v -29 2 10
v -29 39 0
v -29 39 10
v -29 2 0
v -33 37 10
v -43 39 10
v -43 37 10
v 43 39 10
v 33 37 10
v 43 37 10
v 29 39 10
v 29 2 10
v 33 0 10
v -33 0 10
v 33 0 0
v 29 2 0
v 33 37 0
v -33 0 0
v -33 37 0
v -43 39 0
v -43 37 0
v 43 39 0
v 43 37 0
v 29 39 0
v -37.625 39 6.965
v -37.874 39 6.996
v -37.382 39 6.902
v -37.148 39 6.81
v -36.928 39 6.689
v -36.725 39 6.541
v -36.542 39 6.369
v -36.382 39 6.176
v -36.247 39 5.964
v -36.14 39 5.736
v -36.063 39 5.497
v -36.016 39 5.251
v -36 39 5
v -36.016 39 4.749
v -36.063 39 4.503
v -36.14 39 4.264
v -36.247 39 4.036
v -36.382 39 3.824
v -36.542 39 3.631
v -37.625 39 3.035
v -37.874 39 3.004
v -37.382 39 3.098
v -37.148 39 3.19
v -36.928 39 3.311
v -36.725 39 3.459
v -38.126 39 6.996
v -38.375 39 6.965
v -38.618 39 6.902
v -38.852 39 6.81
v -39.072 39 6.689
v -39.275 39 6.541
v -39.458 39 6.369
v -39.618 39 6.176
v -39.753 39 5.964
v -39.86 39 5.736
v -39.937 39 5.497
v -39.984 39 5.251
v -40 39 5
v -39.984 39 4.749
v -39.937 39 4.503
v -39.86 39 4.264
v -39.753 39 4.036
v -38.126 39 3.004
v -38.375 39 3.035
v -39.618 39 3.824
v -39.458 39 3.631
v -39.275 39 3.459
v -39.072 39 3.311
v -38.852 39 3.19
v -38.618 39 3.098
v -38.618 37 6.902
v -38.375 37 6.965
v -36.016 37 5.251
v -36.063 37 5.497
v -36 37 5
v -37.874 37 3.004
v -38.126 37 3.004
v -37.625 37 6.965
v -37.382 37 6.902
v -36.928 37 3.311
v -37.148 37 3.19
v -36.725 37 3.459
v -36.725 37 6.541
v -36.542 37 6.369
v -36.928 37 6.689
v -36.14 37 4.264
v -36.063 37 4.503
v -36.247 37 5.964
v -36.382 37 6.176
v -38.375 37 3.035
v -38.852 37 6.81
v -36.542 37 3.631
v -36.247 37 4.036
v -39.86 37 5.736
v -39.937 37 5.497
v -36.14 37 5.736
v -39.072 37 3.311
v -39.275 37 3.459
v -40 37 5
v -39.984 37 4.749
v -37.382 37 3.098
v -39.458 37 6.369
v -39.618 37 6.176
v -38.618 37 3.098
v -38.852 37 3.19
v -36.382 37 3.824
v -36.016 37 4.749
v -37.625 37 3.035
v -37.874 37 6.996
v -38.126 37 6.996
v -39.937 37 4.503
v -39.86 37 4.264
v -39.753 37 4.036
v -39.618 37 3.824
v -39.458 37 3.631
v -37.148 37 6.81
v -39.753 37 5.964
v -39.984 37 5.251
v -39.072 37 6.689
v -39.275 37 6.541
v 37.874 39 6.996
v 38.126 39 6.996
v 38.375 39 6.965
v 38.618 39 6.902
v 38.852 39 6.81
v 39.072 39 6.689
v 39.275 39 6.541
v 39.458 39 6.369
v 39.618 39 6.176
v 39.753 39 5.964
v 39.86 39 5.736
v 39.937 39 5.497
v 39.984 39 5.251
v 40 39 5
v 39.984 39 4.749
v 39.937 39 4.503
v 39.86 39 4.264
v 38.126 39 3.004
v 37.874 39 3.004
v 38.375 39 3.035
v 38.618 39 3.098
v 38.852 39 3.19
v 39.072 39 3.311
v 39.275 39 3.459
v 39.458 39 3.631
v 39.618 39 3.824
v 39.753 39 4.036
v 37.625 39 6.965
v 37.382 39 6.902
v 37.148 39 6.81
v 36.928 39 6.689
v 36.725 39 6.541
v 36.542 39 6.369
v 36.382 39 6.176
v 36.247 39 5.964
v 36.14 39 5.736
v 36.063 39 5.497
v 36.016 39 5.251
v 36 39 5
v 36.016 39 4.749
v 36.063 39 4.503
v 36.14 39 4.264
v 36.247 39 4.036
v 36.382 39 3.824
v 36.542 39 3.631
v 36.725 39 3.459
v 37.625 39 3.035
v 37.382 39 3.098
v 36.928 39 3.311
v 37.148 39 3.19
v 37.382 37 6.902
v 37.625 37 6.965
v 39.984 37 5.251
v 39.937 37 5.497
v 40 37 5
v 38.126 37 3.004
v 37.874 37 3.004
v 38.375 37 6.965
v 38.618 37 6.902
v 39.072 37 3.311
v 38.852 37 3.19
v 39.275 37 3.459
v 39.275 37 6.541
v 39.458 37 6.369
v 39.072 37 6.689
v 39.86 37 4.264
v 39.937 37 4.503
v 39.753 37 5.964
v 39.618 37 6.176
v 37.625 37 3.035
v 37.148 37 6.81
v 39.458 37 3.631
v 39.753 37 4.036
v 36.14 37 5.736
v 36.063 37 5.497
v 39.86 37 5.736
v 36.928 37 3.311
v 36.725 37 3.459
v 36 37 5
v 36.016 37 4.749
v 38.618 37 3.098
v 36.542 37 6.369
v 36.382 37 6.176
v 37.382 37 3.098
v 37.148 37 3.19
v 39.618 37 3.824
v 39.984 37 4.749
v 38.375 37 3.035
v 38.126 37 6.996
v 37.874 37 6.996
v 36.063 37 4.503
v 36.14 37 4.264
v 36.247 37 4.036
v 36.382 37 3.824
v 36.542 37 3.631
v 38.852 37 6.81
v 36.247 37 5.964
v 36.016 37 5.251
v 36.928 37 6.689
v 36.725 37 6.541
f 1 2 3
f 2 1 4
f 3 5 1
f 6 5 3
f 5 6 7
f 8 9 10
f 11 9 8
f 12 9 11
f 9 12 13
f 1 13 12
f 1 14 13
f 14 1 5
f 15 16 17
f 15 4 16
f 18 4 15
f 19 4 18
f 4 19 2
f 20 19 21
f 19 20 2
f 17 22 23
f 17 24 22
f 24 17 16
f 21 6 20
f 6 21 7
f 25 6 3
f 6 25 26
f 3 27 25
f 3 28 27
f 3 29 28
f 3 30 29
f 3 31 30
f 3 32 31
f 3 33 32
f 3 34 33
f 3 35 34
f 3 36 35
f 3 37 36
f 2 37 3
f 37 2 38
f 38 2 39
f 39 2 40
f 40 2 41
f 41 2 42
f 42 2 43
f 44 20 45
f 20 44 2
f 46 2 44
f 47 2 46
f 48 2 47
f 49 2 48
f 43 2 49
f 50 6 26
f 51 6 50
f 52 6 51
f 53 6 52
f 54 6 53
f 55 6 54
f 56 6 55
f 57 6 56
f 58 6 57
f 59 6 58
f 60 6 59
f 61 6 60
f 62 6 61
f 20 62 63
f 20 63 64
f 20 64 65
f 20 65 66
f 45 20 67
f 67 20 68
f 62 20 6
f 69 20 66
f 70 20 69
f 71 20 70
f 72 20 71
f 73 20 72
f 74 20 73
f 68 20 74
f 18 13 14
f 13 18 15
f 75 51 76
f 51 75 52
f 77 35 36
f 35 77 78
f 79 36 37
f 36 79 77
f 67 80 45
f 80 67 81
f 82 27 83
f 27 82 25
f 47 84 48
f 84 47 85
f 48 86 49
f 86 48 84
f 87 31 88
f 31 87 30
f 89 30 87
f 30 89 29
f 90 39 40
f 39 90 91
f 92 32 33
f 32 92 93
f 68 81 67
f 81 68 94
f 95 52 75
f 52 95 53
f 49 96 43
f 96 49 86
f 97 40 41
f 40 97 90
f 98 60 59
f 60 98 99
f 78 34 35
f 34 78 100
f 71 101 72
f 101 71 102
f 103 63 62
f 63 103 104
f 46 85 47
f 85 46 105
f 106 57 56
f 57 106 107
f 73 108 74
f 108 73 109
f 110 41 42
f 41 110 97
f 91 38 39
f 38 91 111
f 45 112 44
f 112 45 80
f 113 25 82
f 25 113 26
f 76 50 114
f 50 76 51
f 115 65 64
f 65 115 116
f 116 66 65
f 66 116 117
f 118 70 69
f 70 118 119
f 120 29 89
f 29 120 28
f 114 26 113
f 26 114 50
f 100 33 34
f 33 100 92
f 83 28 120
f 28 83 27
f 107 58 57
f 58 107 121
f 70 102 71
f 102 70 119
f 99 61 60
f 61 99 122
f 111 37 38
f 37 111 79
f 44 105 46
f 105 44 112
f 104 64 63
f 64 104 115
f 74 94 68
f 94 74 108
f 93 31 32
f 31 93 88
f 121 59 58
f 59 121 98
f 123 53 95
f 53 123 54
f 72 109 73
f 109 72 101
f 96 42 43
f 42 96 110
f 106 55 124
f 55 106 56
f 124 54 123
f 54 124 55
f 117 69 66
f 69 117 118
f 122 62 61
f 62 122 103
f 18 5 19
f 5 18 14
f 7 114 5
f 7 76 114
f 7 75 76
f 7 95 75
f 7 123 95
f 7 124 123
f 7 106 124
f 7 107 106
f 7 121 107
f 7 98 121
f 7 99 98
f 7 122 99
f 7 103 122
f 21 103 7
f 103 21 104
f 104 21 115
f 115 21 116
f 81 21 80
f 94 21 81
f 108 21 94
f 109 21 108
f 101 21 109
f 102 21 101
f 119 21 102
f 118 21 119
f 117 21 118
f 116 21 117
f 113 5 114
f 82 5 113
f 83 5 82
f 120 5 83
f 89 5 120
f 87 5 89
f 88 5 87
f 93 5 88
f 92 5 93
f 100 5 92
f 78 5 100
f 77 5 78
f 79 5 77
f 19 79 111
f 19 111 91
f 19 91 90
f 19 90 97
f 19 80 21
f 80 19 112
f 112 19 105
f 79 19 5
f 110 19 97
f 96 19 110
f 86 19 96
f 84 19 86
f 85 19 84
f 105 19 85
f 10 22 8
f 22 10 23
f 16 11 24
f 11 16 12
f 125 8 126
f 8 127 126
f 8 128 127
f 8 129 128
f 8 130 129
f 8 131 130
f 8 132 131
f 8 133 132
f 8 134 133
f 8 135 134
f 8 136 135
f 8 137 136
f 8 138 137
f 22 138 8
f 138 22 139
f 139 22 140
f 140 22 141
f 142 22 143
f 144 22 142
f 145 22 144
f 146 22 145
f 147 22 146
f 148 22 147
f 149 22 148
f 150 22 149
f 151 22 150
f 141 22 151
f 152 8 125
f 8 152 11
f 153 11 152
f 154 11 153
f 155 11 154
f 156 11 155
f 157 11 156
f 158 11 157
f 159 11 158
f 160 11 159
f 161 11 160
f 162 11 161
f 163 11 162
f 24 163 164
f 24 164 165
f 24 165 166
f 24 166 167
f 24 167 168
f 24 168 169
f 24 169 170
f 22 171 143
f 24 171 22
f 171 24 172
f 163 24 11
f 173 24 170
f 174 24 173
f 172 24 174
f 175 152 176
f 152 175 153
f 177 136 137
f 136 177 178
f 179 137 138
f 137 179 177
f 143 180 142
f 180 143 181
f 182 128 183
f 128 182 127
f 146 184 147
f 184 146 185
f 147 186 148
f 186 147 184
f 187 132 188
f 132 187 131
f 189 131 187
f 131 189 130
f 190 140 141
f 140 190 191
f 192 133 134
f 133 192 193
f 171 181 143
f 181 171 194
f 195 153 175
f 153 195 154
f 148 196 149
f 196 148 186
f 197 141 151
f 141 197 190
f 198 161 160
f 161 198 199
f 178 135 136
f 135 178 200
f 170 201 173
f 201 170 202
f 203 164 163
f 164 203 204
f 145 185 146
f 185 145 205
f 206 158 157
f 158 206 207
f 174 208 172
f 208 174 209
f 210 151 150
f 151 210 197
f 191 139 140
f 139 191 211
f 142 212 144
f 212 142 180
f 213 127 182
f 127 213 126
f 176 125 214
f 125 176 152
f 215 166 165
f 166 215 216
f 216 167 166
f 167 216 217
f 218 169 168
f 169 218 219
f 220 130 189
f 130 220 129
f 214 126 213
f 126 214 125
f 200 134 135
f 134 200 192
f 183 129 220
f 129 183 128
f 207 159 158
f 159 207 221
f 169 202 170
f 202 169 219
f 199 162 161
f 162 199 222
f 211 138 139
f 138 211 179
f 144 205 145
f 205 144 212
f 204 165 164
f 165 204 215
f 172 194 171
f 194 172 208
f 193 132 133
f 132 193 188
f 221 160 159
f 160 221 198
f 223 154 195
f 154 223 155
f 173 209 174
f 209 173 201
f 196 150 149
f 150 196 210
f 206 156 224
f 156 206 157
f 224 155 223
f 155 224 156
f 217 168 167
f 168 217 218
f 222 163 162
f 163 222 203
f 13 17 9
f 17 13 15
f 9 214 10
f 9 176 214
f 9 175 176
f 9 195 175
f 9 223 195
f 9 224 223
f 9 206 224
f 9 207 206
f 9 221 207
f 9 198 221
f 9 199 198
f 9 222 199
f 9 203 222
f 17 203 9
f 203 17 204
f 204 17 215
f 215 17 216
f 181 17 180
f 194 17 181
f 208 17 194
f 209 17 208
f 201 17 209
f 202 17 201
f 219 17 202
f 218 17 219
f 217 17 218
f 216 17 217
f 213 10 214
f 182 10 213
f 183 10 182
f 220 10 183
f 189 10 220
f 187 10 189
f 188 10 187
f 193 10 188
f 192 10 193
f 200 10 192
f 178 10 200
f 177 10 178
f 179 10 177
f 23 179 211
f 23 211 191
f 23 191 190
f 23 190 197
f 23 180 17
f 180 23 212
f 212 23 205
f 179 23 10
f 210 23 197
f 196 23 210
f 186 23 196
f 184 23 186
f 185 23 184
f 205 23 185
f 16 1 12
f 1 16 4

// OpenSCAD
diameter = 58;
outerdiam = 4;
width = 2;
height = 10;
screw = 4;
screwHolder = 12 + width;

$fn = 50;
part = 1;

module screwSupport(right, supHeight, bigger) {
    
    difference() { 
        color([1,0,0]) cube([screwHolder, supHeight, height]);

        translate([screwHolder / 2 + (right * (width / 2 + 1)), supHeight * 2, height / 2]) rotate([90, 0, 0]) cylinder(d = screw, h = supHeight * 4);

        if(bigger == 1) {
            translate([right * width * 2, 0, 0]) cube([screwHolder, supHeight - width, height]);
        }
    }
}

holderHeight = 39;

if(part == 1) {
    union() {
        translate([-diameter / 2, 0, 0]) cube([diameter, width, height]);

        translate([-(diameter / 2 + screwHolder), 0, 0]) screwSupport(-1, holderHeight, 1);
        translate([diameter / 2, 0, 0]) screwSupport(1, holderHeight, 1);
    }
}
